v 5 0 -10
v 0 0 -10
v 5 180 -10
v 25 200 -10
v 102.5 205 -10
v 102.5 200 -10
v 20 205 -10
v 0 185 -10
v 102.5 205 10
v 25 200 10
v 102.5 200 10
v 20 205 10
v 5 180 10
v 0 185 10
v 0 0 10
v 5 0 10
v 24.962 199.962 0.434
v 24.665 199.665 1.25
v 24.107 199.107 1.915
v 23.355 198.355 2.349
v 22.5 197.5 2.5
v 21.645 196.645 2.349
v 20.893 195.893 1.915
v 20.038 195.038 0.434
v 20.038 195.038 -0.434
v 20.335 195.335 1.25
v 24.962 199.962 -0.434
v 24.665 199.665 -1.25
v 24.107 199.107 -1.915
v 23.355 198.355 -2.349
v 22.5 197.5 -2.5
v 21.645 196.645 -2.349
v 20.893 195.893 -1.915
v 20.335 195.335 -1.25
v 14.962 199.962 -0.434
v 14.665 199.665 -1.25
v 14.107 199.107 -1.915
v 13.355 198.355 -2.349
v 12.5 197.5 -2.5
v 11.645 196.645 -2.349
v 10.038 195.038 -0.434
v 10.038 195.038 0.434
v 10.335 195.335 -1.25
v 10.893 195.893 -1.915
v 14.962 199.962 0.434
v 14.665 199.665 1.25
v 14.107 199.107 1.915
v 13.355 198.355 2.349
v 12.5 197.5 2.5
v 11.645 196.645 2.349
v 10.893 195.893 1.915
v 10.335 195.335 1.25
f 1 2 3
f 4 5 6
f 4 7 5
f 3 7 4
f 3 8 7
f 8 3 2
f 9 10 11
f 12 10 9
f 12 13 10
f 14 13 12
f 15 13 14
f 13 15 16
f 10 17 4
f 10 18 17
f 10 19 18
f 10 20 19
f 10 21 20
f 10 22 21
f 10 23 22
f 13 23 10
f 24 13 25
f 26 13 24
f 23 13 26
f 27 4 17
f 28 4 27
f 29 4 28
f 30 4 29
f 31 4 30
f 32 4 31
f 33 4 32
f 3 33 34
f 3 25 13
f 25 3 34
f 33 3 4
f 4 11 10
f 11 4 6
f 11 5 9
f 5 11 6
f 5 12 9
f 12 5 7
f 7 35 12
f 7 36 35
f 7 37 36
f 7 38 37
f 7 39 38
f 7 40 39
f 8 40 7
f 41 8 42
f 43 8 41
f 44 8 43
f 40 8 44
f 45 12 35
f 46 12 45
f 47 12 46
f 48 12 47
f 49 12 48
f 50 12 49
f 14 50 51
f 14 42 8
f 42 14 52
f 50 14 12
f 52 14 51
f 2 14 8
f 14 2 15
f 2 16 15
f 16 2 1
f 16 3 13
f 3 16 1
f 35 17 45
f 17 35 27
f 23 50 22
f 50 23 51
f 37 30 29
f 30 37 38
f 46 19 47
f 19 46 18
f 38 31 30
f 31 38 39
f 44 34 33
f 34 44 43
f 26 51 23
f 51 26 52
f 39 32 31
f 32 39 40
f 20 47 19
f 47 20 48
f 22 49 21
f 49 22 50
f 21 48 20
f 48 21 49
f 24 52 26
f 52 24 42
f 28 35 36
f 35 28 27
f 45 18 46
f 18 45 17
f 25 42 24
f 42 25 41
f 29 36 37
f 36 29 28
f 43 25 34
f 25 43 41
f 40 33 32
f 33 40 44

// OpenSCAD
// file: main.scad
/*
 * File: main.scad
 * Copyright (c) 2021 Mihail Korkin <korkin_mv@protonmail.ch>
 * License: MIT
*/

stand_upside_radius = 120/2;
stand_height = 5;

led_length = 75;
led_width = 8;

lamp_thickness = 5;
lamp_height = 200;
lamp_width = led_width * 2.5;
lamp_round_height = 20;
lamp_wire_radius = 5/2;

module kch07pl_lamp() {
    $fn=18;
    t=lamp_thickness;
    x=stand_upside_radius+led_length/2;
    y=lamp_height;
    z=lamp_width;
    rh=lamp_round_height;
    wr=lamp_wire_radius;
    
    difference() {
        linear_extrude(z, center = true) {
            polygon([
                [t, 0],
                [t, y-rh],
                [rh+t, y],
                [x+t, y],
                [x+t, y+t],
                [rh, y+t],
                [0, y-rh+t],
                [0, 0]
            ]);
        }
        
        translate([0,y-wr,0]) rotate([0, 90, 0])
            cylinder(h=x+t, r=wr);
    }
}

module kch07pl_lamp_normal() {
    ur = stand_upside_radius;
    
    translate([0, ur-3, -0.001])
        rotate([90, 0, -90])
            kch07pl_lamp();
}

module kch07pl_stand() {
    $fa=5;
    
    ur = stand_upside_radius;
    h = stand_height;
    
    difference() {
        rotate_extrude() {
            polygon(points = [
                [0, 0],
                [ur+h, 0],
                [ur, h],
                [0, h]
            ]);
        }
        
        kch07pl_lamp_normal();
    }
}

module kch07pl() {
    kch07pl_stand();
    kch07pl_lamp_normal();
}

kch07pl();
// main file
/*
 * File: lamp.scad
 * Copyright (c) 2021 Mihail Korkin <korkin_mv@protonmail.ch>
 * License: MIT
 *
 * File for generate stl file.
*/

use <main.scad>

kch07pl_lamp();
